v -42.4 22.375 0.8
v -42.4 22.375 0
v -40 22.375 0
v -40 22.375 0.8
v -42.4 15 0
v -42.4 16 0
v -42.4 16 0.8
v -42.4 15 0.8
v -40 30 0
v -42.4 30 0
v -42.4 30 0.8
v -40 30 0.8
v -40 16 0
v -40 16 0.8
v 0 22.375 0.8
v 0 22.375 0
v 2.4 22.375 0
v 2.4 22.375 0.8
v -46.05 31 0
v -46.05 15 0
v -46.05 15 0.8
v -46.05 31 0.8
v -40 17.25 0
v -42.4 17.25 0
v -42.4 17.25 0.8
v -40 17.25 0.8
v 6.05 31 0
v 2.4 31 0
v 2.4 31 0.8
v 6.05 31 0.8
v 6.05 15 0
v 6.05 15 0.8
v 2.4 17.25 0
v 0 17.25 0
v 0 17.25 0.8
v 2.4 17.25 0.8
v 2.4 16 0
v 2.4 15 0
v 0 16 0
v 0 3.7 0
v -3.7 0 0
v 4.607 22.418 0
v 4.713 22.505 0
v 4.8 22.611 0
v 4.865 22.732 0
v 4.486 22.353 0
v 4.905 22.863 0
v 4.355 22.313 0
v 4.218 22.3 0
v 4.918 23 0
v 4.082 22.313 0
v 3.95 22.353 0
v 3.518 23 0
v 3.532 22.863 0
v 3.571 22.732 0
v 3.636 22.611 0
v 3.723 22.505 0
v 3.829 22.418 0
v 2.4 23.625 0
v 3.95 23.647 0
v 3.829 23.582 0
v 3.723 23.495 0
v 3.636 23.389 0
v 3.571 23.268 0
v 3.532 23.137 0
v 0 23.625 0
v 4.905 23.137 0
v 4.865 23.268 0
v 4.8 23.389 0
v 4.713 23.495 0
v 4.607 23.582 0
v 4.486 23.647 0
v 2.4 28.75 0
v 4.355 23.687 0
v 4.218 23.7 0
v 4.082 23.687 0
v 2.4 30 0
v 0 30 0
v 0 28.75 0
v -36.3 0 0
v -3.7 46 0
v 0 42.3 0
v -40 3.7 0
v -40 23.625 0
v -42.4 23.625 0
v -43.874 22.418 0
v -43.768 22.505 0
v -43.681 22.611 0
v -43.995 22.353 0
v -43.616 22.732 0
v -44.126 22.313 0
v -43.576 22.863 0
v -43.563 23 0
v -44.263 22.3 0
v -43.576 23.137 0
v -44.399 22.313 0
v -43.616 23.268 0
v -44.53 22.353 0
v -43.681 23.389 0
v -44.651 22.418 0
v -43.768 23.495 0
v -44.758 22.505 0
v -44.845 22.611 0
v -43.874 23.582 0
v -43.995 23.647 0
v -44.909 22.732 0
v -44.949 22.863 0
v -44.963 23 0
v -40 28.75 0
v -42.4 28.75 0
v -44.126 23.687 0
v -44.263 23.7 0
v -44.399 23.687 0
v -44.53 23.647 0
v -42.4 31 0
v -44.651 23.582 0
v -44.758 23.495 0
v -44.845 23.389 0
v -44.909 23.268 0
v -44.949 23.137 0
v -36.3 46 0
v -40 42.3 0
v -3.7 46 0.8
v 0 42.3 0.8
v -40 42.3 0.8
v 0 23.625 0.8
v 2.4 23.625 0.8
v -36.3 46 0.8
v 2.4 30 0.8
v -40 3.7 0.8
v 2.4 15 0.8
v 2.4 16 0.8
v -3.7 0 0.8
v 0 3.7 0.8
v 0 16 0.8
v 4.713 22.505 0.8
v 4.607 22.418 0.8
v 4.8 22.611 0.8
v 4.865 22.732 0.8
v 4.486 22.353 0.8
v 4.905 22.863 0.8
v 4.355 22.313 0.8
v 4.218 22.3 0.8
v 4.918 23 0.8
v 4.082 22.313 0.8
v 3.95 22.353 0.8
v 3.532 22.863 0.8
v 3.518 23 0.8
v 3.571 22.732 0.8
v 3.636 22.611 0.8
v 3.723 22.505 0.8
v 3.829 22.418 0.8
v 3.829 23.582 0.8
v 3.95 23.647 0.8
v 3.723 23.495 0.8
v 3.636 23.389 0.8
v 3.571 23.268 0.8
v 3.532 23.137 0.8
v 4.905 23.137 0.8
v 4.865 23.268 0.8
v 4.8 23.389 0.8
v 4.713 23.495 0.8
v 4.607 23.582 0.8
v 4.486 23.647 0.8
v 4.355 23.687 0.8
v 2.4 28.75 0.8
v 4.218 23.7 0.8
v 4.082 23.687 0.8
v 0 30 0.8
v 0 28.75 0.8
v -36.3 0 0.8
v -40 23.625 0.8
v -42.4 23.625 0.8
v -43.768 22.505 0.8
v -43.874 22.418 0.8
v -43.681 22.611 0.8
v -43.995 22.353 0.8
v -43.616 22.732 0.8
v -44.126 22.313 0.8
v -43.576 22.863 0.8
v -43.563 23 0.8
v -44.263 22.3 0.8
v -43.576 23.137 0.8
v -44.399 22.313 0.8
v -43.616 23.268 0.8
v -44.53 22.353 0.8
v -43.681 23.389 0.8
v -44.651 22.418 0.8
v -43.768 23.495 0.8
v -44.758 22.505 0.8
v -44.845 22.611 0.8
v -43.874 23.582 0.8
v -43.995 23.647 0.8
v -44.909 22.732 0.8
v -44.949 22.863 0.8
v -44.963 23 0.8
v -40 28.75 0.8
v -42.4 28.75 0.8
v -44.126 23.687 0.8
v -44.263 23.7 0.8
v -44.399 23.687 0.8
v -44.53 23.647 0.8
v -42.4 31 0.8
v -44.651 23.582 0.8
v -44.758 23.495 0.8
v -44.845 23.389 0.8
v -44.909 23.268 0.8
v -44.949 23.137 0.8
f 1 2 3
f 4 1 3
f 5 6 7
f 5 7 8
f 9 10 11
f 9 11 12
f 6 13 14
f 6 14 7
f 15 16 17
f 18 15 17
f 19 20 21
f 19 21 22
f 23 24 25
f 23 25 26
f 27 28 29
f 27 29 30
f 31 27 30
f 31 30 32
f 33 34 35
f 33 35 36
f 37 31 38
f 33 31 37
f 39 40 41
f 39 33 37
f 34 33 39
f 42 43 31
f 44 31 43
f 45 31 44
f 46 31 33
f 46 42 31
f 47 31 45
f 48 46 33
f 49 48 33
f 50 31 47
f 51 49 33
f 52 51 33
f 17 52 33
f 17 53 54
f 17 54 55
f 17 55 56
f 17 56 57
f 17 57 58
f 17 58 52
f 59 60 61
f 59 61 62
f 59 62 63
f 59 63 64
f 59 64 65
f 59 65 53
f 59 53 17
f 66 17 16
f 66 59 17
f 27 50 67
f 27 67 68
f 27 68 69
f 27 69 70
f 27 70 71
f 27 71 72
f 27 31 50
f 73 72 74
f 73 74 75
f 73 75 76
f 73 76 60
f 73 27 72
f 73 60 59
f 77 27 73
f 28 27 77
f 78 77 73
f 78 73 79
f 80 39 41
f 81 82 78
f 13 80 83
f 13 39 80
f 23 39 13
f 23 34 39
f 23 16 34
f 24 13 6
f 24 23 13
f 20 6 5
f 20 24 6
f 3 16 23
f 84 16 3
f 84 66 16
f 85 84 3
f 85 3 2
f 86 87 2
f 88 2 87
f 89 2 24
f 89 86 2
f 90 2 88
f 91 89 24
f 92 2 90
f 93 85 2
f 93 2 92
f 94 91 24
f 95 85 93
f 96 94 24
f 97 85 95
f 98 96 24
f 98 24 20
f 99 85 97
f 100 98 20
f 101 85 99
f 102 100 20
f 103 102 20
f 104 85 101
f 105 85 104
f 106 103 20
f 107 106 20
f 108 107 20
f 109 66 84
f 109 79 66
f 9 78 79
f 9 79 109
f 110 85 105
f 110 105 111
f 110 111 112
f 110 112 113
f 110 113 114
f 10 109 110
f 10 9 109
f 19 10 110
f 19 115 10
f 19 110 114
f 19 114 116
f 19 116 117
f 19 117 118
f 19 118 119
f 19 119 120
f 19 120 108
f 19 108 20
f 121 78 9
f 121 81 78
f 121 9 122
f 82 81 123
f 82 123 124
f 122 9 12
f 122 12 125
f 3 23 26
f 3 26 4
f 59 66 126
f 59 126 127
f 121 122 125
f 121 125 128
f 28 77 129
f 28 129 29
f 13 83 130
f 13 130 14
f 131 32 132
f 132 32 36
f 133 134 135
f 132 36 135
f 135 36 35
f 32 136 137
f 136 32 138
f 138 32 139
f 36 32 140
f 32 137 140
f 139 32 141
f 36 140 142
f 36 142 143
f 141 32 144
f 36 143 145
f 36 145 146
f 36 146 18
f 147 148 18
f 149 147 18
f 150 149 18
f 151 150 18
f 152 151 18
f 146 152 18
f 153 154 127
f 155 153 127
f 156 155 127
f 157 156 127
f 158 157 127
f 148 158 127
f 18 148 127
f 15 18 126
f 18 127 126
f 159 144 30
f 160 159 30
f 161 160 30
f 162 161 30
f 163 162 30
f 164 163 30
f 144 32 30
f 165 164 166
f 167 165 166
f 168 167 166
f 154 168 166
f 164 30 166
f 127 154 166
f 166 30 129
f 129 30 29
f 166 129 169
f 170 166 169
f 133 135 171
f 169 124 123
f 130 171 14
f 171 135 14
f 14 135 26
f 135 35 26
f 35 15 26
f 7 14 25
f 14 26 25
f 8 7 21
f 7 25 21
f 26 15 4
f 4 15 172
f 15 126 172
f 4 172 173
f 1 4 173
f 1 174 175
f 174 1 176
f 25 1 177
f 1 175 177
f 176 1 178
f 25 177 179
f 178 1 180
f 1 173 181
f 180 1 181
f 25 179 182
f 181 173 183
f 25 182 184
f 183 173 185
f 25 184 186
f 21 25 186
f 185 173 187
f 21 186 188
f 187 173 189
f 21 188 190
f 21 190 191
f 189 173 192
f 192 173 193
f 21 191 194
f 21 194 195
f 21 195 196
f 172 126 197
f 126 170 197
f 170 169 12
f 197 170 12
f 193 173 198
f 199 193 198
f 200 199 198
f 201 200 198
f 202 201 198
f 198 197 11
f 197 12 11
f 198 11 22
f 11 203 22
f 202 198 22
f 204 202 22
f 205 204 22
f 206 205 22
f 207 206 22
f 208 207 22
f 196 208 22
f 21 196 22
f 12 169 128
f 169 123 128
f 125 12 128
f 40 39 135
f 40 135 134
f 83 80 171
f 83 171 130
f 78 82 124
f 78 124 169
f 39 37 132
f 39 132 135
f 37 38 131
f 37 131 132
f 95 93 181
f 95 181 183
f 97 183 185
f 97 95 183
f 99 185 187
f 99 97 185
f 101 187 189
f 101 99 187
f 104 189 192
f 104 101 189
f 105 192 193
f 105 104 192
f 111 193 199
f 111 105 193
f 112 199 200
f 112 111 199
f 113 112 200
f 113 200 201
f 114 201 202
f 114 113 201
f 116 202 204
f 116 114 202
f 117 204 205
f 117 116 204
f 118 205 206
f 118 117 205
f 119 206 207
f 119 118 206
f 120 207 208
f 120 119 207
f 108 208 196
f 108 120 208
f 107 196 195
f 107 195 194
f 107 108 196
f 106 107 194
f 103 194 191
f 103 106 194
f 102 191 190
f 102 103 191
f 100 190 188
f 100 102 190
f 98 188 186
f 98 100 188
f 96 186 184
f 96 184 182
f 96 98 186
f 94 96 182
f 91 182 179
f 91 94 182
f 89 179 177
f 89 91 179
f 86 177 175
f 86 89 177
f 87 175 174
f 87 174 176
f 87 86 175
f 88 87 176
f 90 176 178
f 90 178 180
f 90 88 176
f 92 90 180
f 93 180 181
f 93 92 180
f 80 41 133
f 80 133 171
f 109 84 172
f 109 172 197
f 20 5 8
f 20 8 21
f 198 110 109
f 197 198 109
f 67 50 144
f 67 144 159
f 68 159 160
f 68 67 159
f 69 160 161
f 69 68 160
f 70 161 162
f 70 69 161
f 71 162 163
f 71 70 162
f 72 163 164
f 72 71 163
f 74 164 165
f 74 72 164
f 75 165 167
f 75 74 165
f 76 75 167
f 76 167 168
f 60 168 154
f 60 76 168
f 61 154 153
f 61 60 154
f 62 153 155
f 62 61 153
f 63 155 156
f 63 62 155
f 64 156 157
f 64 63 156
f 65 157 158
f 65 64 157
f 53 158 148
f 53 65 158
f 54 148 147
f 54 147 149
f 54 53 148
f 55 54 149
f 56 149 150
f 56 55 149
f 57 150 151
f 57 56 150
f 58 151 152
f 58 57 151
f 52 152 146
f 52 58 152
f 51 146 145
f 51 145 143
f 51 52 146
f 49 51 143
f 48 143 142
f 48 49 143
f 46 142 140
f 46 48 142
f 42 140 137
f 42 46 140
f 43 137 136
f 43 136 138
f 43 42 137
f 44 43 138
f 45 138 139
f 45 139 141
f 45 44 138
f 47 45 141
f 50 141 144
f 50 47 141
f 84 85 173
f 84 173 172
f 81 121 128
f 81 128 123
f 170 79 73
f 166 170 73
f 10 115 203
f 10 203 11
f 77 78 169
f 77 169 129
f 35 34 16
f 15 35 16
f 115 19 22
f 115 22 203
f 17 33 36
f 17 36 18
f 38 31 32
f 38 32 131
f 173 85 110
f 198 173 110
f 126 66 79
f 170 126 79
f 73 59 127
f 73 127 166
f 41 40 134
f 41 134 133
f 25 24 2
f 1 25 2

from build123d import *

# Parameters (mm, degrees)
SKETCH1_R           = 0.7
SKETCH1_W           = 2.4
SKETCH1_H           = 5.125
BOSS_EXTRUDE1_DEPTH = 0.8


with BuildPart() as part:
    # Sketch1 → Boss-Extrude1 (new body)
    with BuildSketch(Plane.XY):
        Polygon((0, 30), (2.4, 30), (2.4, 31), (6.05, 31), (6.05, 15), (2.4, 15), (2.4, 16), (0, 16), (0, 3.7), (-3.7, 0), (-36.3, 0), (-40, 3.7), (-40, 16), (-42.4, 16), (-42.4, 15), (-46.05, 15), (-46.05, 31), (-42.4, 31), (-42.4, 30), (-40, 30), (-40, 42.3), (-36.3, 46), (-3.7, 46), (0, 42.3), align=None)
        with Locations((4.21811613, 23)):
            Circle(SKETCH1_R, mode=Mode.SUBTRACT)
        with Locations((-44.262582218, 23)):
            Circle(SKETCH1_R, mode=Mode.SUBTRACT)
        with Locations((1.2, 19.8125)):
            Rectangle(SKETCH1_W, SKETCH1_H, mode=Mode.SUBTRACT)
        with Locations((1.2, 26.1875)):
            Rectangle(SKETCH1_W, SKETCH1_H, mode=Mode.SUBTRACT)
        with Locations((-41.2, 26.1875)):
            Rectangle(SKETCH1_W, SKETCH1_H, mode=Mode.SUBTRACT)
        with Locations((-41.2, 19.8125)):
            Rectangle(SKETCH1_W, SKETCH1_H, mode=Mode.SUBTRACT)
    extrude(amount=BOSS_EXTRUDE1_DEPTH)


solid = part.part
